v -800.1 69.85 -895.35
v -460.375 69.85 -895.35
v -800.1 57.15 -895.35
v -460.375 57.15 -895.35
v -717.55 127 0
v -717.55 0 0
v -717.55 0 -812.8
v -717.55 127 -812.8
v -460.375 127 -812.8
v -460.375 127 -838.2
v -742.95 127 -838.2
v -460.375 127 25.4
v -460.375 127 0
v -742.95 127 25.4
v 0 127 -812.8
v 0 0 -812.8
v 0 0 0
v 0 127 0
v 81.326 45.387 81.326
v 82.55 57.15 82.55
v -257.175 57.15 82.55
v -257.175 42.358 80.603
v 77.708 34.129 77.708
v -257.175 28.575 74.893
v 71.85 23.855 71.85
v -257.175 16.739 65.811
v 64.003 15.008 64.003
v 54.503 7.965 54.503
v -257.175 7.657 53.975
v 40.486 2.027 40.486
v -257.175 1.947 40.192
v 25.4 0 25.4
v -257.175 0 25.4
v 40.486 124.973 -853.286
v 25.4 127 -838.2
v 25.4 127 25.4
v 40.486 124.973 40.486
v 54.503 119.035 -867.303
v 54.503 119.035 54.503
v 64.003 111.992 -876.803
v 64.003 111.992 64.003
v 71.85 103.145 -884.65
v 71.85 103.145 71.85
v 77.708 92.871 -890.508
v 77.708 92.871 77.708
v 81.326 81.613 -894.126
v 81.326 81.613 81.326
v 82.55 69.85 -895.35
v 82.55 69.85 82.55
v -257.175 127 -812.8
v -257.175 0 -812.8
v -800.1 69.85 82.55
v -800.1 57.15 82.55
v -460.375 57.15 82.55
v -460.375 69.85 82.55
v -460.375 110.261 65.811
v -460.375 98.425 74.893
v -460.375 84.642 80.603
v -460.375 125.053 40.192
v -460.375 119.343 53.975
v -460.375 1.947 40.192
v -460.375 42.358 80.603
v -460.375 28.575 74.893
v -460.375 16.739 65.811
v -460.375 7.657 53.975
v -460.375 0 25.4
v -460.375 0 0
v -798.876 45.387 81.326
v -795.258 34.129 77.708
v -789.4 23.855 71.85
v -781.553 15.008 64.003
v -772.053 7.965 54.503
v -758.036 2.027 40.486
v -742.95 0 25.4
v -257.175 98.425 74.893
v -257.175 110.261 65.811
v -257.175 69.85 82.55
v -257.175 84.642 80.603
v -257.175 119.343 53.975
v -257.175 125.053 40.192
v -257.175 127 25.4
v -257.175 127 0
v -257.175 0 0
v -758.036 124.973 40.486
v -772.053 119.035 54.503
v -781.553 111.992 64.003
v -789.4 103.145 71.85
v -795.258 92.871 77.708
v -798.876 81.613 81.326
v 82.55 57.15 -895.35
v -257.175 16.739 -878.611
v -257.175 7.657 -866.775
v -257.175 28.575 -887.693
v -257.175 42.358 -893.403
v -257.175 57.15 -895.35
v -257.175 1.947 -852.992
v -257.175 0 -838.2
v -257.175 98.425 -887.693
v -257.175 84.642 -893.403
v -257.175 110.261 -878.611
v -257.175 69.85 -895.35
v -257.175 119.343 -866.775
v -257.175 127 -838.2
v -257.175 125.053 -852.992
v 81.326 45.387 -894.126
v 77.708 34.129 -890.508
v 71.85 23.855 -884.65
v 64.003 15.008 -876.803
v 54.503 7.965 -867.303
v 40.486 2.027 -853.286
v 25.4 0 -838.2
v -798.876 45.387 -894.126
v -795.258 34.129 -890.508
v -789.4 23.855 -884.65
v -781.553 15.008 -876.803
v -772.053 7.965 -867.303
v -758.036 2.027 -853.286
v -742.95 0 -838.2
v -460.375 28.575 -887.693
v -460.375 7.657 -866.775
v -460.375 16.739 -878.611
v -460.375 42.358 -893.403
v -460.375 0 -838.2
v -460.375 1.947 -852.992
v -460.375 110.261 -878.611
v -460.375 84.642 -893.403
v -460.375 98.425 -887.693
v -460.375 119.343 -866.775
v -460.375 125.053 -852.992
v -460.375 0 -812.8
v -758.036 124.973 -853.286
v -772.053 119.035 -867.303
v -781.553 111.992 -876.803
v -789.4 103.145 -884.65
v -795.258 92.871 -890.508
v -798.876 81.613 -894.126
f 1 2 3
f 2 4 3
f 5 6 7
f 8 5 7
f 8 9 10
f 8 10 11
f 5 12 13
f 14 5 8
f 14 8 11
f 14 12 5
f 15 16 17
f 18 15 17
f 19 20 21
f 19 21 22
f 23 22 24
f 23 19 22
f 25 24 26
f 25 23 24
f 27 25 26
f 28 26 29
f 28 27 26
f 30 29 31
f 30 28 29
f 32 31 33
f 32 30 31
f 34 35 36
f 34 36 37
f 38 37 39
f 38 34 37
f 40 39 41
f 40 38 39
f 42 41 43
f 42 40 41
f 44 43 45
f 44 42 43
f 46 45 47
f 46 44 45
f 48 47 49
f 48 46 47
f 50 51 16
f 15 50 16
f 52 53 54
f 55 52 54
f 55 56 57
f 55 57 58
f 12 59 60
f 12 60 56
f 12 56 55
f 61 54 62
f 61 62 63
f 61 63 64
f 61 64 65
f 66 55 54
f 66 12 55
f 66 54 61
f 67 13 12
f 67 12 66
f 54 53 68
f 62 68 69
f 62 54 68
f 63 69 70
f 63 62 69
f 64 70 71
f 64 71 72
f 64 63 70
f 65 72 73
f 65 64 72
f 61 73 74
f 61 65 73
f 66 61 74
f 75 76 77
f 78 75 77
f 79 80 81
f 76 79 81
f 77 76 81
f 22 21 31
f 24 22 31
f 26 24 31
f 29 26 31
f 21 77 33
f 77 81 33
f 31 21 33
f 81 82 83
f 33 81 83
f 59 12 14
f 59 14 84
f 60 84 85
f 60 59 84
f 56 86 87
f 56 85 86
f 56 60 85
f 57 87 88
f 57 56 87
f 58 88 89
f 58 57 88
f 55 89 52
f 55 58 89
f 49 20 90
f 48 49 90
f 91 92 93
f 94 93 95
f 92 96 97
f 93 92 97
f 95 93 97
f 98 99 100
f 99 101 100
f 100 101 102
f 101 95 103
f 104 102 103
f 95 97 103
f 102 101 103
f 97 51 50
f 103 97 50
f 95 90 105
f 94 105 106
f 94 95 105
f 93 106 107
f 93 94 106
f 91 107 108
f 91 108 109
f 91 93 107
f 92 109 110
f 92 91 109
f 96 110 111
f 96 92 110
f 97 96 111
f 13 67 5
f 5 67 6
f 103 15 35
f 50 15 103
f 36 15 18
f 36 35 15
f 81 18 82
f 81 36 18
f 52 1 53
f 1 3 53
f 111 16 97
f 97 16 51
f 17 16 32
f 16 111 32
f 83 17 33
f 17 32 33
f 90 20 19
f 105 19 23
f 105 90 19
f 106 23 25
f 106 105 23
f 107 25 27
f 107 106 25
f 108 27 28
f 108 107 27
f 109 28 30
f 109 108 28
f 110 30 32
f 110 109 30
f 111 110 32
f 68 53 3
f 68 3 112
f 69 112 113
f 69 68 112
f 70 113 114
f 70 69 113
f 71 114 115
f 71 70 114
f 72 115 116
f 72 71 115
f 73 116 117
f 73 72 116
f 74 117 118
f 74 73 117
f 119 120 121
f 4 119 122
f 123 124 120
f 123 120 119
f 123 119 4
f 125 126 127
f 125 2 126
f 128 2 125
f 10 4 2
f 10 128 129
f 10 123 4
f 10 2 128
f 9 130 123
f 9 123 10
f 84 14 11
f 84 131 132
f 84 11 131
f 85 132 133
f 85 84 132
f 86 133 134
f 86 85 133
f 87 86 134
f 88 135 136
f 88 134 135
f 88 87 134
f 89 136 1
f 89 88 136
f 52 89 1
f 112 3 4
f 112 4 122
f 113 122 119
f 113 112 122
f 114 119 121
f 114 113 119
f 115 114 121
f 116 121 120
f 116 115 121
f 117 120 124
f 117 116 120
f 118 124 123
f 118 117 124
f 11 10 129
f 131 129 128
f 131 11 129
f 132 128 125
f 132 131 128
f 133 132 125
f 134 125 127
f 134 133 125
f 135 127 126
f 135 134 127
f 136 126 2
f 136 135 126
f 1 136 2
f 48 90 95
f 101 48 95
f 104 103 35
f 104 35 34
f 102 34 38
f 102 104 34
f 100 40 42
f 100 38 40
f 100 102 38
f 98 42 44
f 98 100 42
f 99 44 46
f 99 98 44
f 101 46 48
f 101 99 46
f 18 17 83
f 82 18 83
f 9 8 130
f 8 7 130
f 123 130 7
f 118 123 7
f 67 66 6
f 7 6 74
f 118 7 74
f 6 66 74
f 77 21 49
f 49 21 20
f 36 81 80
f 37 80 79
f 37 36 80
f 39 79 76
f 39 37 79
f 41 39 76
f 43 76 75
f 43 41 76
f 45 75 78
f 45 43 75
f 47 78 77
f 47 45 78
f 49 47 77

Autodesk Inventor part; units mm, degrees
ref_plane "YZ Plane" through (0, 0, 0) normal (1, 0, 0) x (0, 1, 0)
ref_plane "XZ Plane" through (0, 0, 0) normal (0, 1, 0) x (-1, 0, 0)
sketch "Sketch1" plane through (0, 0, 0) normal (0, 1, 0) x (-1, 0, 0)
  line L0 (0, 0) -> (717.55, 0)
  line L1 (717.55, 0) -> (717.55, -812.8)
  line L2 (717.55, -812.8) -> (0, -812.8)
  line L3 (0, -812.8) -> (0, 0)
  line L4 (800.1, -895.35) -> (800.1, 82.55)
  line L5 (800.1, 82.55) -> (-82.55, 82.55)
  line L6 (-82.55, 82.55) -> (-82.55, -895.35)
  line L7 (-82.55, -895.35) -> (800.1, -895.35)
  dimension "d0" = 812.8
  dimension "d1" = 717.55
  dimension "d2" = 82.55
extrude "Extrusion1" add sketch "Sketch1" along normal blind 127
fillet "Fillet1" radius 57.15 8 edges at (82.55, 127, -406.4) (82.55, 0, -406.4) (-358.775, 0, 82.55) (-358.775, 127, 82.55) (-358.775, 127, -895.35) (-358.775, 0, -895.35) (-800.1, 127, -406.4) (-800.1, 0, -406.4)
sketch "Sketch2" plane through (0, 0, 0) normal (0, 0, -1) x (-1, 0, 0)
  line L0 (717.55, 0) -> (0, 0) projected
  line L1 (717.55, 0) -> (717.55, 127) projected
  line L2 (0, 127) -> (717.55, 127) projected
  line L3 (0, 0) -> (0, 127) projected
  line L4 (460.375, 127) -> (460.375, 0)
  line L5 (717.55, 0) -> (0, 0) projected
  line L6 (0, 127) -> (717.55, 127) projected
  line L7 (257.175, 127) -> (257.175, 0)
  line L8 (358.775, 0) -> (358.775, 127)
  dimension "d6" = 203.2
extrude "Extrusion2" cut sketch "Sketch2" against normal blind 127 contours L0 L8 L2 L4 | L0 L7 L2 L8
ref_plane "Work Plane1" through (-800.1, 57.15, -406.4) normal (0, 0, 1) x (1, 0, 0)
mirror "Mirror1" about plane through (-800.1, 57.15, -406.4) normal (0, 0, 1) of "Extrusion2"
properties part number "Bumbers.ver1-1111-2019" material "Nylon 6/6"
